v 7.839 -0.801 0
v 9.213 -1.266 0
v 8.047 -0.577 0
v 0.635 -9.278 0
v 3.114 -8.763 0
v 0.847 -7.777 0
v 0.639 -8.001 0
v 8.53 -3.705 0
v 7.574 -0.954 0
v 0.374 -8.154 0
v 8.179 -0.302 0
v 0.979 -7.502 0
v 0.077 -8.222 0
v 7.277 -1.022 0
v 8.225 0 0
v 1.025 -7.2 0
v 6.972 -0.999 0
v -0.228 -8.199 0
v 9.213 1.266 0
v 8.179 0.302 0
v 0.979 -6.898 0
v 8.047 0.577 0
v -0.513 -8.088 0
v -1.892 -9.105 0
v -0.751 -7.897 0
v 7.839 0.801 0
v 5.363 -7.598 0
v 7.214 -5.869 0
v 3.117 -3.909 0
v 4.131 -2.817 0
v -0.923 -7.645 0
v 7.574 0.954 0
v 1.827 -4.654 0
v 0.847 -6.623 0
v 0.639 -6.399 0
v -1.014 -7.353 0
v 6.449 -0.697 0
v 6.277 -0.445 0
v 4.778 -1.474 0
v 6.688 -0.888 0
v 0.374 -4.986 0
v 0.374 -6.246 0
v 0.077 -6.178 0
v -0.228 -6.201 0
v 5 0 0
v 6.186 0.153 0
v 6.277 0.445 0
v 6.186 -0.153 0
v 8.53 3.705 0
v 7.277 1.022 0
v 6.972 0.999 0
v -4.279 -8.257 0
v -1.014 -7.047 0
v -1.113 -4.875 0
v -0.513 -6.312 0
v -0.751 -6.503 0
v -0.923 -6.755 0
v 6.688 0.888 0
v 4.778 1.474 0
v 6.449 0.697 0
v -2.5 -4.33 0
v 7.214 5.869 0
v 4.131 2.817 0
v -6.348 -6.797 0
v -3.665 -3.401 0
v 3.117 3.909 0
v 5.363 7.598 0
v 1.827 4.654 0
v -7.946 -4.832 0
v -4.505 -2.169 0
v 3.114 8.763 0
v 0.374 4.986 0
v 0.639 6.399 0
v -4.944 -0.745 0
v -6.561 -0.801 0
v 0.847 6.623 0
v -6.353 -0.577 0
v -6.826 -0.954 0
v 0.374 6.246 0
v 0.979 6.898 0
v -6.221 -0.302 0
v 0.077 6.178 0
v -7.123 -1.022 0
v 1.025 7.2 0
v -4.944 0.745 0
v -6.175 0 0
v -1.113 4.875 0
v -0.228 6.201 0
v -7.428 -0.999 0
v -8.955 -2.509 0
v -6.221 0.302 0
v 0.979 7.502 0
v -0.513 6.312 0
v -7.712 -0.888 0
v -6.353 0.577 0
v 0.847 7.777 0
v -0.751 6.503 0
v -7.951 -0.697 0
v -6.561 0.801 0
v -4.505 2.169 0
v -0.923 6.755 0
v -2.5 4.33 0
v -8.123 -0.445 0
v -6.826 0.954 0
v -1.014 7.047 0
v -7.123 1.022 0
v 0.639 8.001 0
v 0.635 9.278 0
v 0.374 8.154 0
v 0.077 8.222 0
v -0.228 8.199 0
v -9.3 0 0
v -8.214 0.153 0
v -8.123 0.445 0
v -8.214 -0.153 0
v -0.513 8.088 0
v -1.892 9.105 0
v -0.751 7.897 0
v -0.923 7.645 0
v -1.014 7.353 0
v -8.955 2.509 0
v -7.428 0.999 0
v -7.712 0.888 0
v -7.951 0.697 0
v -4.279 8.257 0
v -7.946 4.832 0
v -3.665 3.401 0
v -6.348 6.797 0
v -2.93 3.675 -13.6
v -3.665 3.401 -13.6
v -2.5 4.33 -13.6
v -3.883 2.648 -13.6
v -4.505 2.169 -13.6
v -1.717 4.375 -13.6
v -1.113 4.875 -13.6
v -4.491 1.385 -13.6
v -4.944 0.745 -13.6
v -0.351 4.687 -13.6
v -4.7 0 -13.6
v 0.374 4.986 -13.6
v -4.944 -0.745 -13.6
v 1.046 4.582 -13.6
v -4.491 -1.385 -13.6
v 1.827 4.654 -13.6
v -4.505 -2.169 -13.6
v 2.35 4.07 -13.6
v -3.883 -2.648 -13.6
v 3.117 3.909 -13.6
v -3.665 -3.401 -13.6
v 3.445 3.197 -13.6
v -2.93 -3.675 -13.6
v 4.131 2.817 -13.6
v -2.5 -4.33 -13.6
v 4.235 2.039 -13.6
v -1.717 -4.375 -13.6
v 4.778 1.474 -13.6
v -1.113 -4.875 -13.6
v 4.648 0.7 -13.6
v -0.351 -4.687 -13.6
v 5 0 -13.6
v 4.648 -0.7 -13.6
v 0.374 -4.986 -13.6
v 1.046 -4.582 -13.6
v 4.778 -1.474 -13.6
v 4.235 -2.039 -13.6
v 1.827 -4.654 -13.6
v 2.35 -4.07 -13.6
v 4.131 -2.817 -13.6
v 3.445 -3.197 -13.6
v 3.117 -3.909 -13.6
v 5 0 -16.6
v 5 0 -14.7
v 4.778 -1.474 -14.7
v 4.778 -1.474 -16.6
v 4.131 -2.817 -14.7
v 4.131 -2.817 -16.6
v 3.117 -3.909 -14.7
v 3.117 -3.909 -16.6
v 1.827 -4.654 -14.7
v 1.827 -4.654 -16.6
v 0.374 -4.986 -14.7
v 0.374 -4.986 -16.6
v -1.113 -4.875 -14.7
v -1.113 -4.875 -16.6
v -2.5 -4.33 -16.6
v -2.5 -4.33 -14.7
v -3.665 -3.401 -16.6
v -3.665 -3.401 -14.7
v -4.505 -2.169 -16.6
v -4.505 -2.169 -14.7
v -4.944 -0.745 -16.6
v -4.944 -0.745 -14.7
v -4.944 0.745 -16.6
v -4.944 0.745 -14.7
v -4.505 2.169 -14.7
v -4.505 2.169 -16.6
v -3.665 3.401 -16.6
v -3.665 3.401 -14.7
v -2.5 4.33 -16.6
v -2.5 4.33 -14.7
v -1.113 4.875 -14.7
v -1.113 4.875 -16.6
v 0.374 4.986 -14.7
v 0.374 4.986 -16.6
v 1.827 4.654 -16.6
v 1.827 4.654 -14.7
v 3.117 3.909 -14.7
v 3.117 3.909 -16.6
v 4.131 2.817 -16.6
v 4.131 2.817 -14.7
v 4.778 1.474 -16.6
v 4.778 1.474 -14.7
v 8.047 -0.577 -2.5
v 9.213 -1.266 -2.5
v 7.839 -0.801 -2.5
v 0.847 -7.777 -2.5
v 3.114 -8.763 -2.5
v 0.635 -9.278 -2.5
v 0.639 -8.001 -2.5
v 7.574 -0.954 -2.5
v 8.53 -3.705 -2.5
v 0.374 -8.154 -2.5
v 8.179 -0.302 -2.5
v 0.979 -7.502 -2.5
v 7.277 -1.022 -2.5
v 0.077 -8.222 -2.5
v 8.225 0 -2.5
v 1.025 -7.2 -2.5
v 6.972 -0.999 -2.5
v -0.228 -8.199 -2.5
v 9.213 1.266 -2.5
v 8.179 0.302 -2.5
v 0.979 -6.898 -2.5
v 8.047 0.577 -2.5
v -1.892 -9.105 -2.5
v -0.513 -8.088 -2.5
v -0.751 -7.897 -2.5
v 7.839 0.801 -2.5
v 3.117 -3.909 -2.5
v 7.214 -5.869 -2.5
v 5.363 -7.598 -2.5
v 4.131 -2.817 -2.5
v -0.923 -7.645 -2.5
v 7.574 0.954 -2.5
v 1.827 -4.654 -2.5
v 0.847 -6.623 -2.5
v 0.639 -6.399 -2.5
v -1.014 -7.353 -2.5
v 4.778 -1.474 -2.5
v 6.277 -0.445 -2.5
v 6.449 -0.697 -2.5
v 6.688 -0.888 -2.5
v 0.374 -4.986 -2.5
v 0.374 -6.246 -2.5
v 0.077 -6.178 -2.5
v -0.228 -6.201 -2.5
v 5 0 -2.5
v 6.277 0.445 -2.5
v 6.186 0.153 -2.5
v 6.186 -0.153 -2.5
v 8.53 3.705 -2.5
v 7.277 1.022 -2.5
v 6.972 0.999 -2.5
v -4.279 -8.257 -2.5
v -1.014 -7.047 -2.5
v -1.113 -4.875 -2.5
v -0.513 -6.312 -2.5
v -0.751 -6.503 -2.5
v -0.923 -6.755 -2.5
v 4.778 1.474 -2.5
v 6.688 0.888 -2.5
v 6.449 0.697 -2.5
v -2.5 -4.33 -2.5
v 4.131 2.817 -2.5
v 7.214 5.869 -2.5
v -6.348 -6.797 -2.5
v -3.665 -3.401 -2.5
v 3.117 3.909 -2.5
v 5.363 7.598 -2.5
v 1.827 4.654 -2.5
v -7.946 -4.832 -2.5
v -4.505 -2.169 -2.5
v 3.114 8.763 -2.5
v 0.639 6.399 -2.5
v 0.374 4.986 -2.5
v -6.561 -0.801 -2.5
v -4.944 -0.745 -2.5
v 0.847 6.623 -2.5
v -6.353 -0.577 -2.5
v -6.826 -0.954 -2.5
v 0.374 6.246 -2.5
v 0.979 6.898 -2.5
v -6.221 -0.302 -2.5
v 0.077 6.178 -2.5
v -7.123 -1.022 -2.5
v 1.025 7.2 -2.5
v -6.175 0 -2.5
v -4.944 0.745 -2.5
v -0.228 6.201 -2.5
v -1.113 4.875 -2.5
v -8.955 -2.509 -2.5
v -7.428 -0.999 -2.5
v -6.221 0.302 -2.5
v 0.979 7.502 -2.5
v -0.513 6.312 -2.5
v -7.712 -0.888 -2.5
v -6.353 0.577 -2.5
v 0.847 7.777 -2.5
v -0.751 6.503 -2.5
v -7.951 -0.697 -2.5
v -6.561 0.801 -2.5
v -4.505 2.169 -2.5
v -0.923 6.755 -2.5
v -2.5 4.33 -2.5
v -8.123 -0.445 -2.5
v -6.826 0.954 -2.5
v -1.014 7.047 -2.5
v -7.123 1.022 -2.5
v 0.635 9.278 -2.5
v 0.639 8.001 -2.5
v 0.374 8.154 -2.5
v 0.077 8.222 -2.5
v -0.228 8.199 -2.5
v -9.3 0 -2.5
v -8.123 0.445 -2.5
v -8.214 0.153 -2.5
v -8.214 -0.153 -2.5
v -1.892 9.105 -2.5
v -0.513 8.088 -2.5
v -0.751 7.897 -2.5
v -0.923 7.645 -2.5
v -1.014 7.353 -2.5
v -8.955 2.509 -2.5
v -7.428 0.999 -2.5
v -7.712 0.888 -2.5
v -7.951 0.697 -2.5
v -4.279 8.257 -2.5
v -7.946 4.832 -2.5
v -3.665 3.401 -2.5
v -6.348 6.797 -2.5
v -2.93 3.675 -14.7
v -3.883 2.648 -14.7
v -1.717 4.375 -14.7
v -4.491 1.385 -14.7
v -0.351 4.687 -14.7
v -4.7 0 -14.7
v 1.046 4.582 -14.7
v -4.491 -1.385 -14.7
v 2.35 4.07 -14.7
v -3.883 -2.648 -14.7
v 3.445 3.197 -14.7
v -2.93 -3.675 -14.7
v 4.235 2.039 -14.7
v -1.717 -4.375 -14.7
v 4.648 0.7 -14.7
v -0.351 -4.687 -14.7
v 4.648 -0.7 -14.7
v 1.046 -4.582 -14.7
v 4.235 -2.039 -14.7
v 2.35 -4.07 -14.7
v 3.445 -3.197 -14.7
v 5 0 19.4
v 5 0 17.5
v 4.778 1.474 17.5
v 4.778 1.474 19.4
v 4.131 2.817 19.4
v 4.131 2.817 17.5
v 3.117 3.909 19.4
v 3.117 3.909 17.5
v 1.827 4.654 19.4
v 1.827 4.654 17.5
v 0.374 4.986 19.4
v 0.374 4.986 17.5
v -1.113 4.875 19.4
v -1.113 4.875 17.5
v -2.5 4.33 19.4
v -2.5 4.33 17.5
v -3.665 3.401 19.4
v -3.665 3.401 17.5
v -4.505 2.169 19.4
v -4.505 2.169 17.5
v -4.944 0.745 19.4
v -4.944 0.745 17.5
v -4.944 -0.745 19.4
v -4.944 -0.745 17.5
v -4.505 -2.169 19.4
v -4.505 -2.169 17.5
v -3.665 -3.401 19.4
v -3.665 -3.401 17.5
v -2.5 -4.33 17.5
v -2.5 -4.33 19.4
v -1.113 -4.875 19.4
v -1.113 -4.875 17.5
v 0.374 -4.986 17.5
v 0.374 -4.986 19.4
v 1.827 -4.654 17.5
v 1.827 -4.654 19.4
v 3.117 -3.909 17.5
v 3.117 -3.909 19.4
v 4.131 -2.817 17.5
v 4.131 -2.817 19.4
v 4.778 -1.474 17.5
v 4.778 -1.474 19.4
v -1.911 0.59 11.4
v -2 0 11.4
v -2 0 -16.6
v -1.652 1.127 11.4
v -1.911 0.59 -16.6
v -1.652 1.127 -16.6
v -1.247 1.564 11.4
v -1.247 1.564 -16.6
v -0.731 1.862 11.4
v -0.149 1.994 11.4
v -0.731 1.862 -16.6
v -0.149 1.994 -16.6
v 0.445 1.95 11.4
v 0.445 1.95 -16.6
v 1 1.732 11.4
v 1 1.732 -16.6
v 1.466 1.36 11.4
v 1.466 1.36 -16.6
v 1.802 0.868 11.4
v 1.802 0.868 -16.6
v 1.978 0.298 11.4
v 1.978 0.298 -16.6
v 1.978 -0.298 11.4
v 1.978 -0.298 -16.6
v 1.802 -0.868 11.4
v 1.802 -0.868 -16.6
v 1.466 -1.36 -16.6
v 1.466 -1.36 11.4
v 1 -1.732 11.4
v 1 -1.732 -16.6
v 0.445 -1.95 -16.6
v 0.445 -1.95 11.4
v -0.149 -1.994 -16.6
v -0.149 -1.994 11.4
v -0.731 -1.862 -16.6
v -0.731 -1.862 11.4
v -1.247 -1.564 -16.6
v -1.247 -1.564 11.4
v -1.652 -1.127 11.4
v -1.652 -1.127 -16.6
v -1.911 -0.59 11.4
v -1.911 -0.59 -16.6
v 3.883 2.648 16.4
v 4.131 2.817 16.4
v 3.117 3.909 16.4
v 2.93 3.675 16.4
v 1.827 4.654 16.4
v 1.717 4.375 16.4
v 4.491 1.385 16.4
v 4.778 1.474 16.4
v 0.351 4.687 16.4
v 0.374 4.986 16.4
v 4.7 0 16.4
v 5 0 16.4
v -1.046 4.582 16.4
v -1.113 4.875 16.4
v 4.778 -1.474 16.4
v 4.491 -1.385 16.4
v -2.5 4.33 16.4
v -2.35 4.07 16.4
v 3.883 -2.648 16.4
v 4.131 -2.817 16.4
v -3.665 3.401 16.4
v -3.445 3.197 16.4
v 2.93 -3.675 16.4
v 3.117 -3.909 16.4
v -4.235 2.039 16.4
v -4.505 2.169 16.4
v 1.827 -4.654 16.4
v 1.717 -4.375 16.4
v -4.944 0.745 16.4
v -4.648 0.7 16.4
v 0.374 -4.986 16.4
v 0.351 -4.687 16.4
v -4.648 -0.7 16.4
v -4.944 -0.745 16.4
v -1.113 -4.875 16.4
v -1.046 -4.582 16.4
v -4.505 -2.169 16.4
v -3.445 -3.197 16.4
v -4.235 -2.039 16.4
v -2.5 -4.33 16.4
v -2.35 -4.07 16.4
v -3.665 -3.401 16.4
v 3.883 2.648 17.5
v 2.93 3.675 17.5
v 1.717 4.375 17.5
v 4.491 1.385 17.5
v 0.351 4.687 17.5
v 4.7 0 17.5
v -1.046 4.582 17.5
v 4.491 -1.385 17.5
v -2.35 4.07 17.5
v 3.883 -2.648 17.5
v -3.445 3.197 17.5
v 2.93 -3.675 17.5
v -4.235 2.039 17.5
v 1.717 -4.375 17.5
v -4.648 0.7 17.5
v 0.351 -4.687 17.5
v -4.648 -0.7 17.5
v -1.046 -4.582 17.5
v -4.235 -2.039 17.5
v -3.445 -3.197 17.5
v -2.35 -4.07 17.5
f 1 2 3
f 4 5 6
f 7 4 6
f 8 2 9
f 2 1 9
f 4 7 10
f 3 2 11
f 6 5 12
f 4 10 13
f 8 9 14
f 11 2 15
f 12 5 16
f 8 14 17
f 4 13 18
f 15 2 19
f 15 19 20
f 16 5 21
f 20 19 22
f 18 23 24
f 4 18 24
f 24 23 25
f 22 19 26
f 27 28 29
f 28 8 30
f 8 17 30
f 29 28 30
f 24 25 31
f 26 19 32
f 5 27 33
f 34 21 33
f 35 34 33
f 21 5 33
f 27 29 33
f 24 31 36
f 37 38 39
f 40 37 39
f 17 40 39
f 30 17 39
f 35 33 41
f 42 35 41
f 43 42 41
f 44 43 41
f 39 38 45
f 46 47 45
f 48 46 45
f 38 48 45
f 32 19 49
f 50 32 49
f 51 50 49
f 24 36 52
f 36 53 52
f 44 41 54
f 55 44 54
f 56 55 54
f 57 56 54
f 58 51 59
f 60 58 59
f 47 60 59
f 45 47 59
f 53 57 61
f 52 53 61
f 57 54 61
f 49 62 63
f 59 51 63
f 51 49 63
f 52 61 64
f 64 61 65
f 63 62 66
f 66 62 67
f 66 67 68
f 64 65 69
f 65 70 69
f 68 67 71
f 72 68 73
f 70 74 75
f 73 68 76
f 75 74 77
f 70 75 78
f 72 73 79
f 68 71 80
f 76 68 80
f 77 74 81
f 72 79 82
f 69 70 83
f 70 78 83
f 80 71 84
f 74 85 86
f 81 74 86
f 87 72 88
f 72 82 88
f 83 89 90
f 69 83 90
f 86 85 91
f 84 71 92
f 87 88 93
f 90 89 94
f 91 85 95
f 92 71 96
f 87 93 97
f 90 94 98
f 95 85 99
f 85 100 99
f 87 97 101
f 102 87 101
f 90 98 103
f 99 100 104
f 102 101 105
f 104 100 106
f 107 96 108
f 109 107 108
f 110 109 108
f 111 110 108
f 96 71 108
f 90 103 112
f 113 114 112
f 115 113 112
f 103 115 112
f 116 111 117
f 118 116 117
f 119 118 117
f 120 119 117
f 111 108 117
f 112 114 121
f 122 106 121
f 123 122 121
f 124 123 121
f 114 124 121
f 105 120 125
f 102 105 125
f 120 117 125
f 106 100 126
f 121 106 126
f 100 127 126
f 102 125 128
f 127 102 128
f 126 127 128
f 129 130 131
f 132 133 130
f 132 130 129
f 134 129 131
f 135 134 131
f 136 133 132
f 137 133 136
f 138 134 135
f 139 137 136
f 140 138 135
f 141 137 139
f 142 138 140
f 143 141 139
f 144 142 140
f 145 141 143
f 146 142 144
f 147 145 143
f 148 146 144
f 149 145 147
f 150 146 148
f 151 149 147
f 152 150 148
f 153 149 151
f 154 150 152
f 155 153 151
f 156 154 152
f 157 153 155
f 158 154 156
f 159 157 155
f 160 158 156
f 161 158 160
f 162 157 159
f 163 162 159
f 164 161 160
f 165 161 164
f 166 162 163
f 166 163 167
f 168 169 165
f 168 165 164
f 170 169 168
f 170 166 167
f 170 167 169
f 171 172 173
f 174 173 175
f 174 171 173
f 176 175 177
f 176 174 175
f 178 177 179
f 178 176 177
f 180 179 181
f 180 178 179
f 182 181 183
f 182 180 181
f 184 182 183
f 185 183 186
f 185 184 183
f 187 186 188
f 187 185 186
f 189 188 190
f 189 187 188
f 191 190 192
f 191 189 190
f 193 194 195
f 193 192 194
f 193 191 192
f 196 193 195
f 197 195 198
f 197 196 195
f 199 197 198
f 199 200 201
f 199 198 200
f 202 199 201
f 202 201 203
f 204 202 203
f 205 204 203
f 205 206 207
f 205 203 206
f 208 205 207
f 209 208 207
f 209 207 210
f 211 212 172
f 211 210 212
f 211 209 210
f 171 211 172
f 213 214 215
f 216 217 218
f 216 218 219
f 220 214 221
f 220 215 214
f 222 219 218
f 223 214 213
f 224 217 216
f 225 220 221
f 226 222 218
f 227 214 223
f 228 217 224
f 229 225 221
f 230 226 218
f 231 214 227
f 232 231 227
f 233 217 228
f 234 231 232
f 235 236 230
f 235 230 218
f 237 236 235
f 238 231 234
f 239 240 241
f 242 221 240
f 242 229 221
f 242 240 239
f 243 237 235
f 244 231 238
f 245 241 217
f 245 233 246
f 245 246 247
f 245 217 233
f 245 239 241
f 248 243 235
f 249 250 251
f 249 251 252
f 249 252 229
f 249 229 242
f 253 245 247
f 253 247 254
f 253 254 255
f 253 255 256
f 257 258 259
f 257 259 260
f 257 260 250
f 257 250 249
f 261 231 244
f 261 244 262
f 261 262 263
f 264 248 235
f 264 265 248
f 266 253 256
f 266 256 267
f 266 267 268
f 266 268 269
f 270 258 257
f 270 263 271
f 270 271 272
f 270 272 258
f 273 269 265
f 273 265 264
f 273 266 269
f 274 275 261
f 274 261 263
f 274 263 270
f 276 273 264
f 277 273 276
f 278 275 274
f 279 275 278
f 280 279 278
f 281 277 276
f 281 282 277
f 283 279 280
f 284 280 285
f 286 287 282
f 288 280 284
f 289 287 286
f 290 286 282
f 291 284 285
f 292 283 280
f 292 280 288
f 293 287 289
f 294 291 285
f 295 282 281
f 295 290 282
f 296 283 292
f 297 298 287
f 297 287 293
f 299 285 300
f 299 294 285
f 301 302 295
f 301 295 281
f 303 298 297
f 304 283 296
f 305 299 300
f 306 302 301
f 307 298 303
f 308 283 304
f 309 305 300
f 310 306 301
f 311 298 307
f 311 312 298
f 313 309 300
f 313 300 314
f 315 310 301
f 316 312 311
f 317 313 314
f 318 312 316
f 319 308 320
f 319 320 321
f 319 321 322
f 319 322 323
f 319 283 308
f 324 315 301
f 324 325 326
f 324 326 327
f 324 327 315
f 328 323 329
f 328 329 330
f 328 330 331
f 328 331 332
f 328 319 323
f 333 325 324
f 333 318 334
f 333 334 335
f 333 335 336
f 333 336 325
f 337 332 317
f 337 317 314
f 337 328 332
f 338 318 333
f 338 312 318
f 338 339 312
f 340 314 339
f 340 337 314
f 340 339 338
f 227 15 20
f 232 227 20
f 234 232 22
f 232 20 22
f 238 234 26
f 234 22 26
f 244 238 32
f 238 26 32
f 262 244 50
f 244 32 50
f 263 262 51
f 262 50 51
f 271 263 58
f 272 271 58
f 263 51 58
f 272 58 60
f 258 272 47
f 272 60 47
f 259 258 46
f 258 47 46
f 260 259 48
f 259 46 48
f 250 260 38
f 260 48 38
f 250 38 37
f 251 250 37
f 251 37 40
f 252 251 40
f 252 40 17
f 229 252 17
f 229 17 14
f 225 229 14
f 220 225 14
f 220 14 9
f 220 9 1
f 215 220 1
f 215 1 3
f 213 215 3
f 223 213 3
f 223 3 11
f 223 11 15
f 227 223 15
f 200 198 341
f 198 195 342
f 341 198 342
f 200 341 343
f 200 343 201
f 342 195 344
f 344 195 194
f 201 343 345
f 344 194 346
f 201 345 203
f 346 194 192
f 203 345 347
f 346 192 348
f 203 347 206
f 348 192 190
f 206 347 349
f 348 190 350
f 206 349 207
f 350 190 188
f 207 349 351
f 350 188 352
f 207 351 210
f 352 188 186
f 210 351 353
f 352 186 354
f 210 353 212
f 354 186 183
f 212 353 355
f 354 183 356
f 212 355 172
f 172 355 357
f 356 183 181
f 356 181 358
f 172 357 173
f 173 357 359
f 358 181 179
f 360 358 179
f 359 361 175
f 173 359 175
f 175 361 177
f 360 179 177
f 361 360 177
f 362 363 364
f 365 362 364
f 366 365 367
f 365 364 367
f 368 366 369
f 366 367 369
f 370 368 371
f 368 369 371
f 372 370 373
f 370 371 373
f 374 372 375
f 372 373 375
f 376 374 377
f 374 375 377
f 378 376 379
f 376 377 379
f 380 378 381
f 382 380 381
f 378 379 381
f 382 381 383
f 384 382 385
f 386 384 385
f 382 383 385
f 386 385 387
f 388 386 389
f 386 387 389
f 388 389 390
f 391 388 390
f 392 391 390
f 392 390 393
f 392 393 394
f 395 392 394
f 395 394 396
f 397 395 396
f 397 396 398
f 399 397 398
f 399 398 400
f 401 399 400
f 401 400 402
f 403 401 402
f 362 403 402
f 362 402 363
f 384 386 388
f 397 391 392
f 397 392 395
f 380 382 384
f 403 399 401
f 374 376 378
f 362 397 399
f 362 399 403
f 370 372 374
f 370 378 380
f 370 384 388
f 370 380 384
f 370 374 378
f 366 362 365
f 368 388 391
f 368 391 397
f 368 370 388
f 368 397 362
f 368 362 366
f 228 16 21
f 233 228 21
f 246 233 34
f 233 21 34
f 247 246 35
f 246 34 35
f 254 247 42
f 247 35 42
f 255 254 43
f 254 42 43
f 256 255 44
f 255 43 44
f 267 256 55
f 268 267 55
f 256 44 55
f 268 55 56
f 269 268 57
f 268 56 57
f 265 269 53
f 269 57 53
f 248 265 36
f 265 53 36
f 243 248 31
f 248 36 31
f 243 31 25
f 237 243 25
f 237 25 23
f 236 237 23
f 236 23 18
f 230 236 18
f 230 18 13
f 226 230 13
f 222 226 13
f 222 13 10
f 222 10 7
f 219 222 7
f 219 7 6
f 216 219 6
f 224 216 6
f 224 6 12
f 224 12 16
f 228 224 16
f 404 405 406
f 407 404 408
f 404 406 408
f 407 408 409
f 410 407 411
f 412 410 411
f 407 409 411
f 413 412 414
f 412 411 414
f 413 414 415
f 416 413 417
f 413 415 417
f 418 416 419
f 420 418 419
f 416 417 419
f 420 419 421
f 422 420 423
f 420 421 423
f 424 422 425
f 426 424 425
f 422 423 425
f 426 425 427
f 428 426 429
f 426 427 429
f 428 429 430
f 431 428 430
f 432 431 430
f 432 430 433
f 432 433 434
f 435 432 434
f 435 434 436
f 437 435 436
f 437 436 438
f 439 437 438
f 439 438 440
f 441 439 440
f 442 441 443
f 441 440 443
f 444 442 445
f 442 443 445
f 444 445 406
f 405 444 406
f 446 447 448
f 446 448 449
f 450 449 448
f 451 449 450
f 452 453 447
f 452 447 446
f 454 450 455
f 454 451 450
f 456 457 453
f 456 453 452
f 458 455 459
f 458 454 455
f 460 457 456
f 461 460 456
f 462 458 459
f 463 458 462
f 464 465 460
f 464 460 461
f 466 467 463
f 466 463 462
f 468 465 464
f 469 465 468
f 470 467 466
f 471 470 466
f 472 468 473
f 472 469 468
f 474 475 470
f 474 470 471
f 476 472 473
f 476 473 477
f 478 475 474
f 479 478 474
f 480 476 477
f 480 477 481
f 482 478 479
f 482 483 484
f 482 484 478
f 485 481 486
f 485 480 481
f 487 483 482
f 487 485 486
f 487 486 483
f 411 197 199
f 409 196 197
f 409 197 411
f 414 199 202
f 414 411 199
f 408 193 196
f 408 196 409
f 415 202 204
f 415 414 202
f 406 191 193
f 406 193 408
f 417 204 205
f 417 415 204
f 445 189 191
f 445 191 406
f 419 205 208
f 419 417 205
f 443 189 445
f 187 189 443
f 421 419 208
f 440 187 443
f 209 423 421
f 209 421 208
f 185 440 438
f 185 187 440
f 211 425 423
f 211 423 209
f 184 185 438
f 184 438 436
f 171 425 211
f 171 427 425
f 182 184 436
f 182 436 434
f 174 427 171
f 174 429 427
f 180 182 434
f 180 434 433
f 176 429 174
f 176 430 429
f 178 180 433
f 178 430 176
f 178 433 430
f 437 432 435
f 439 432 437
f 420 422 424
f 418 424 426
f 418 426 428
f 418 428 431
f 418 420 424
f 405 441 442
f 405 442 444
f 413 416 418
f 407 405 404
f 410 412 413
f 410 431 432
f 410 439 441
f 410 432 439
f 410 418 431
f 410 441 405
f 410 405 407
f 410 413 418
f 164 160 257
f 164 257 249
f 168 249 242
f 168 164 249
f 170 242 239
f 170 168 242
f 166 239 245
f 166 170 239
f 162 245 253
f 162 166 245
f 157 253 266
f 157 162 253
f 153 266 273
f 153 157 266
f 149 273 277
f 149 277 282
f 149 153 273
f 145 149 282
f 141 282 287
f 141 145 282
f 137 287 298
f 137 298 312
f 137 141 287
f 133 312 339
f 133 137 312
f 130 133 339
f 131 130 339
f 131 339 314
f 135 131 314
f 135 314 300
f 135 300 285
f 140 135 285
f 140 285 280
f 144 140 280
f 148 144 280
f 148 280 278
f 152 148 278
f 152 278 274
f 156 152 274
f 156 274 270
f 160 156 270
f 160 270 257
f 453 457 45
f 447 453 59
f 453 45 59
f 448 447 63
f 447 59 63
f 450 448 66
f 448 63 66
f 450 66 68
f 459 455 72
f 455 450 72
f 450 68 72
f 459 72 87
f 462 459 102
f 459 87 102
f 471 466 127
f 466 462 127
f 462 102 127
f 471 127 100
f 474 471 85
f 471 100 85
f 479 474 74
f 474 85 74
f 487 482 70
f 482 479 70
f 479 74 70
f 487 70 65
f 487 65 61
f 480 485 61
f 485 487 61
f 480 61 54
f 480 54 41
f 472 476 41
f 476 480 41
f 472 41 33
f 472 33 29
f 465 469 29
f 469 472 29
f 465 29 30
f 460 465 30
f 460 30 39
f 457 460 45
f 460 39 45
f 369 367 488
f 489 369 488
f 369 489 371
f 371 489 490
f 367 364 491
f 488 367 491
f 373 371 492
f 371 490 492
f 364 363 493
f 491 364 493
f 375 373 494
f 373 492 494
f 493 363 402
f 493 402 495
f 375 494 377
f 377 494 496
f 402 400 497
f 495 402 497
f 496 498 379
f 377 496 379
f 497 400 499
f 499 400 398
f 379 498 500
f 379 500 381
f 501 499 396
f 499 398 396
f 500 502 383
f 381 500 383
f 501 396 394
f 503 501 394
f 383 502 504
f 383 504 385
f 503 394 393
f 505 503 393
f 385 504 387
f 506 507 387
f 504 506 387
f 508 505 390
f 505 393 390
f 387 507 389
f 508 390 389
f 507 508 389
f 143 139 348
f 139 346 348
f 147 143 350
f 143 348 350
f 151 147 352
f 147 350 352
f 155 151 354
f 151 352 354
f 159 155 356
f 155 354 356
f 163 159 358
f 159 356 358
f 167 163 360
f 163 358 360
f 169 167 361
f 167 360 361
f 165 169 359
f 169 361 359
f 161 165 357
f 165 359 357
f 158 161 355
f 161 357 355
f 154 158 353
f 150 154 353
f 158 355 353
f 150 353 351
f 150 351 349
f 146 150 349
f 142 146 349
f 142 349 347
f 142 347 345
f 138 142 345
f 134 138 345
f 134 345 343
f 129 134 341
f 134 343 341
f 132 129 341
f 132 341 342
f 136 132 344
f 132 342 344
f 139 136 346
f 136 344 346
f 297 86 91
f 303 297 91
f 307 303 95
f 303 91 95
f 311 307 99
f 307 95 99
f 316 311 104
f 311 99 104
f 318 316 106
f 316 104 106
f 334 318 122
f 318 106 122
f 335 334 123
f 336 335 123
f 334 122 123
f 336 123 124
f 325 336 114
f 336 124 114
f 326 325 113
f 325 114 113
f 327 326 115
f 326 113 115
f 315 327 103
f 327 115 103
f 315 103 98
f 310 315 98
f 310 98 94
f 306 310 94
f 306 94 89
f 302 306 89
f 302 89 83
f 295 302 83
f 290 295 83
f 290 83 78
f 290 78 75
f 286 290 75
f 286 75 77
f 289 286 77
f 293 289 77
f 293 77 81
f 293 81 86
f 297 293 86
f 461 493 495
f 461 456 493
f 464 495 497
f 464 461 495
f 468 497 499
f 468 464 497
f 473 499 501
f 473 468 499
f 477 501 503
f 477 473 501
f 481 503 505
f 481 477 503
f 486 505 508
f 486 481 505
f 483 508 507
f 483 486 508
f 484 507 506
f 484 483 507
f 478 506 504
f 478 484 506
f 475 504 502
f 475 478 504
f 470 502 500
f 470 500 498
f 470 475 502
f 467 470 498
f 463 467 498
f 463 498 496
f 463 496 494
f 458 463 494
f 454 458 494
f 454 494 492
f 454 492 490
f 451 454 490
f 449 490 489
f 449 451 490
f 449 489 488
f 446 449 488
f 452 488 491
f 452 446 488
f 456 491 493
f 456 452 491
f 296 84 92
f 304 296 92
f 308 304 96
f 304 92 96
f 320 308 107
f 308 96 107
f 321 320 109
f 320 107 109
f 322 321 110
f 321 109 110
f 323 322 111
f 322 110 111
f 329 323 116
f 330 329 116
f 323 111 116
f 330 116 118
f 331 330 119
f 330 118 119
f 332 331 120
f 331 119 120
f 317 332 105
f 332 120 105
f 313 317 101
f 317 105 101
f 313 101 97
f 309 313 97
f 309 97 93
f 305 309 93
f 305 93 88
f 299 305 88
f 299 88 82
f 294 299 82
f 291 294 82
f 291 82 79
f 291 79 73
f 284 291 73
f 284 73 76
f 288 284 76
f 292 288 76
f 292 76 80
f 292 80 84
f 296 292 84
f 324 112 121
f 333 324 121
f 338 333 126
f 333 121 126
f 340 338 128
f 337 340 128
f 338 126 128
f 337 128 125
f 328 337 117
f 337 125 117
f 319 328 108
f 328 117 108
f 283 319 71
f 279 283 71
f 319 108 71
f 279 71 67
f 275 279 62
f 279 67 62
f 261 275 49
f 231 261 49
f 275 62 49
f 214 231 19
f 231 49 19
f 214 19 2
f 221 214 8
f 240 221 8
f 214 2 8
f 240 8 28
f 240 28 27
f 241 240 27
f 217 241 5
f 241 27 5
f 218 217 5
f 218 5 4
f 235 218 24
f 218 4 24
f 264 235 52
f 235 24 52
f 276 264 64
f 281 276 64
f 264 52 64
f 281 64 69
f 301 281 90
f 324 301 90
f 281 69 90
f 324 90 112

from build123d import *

# Parameters (mm, degrees)
SKETCH_1_R               = 5
EXTRUDE_1_DEPTH          = 19.4
SKETCH_2_R               = 9.3
EXTRUDE_2_DEPTH          = 2.5
EXTRUDE_START            = 14.1
SKETCH_3_R               = 5
EXTRUDE_3_DEPTH          = 14.1
SKETCH_5_W               = 0.3
SKETCH_5_H               = 1.1
SKETCH_6_W               = 0.3
SKETCH_6_H               = 1.1
HOLE_WIZARD_M2_5_2_D     = 2.05
HOLE_WIZARD_M2_5_2_DEPTH = 7.25
HOLE_WIZARD_M2_5_2_TIP   = 0.591784026
SKETCH_12_R              = 2
CUT_EXTRUDE_1_DEPTH      = 28


with BuildPart() as part:
    # 草图1 → 凸台-拉伸1 (new body)
    with BuildSketch(Plane.XY):
        Circle(SKETCH_1_R)
    extrude(amount=EXTRUDE_1_DEPTH)

    # 草图2 → 凸台-拉伸2 (add)
    with BuildSketch(Plane(origin=(0, 0, 0), x_dir=(-1, 0, 0), z_dir=(0, 0, -1))):
        Circle(SKETCH_2_R)
    extrude(amount=EXTRUDE_2_DEPTH)

    # 草图3 → 凸台-拉伸3 (add)
    with BuildSketch(Plane(origin=(0, 0, -2.5), x_dir=(-1, 0, 0), z_dir=(0, 0, -1)).offset(EXTRUDE_START)):
        with Locations(Location((0, 0, 0), (0, 0, 180))):
            Circle(SKETCH_3_R)
    extrude(amount=-EXTRUDE_3_DEPTH)

    # 草图5 → 切除-旋转3 (revolve, cut)
    with BuildSketch(Plane(origin=(0, 0, 0), x_dir=(1, 0, 0), z_dir=(0, 1, 0)), mode=Mode.PRIVATE) as cut_revolve_3_sk:
        with Locations((4.85, 14.15)):
            Rectangle(SKETCH_5_W, SKETCH_5_H)
    revolve(cut_revolve_3_sk.sketch.rotate(Axis((0, 0, -16.6), (0, 0, 1)), 180), axis=Axis((0, 0, -16.6), (0, 0, 1)), mode=Mode.SUBTRACT)

    # 草图6 → 切除-旋转4 (revolve, cut)
    with BuildSketch(Plane(origin=(0, 0, 0), x_dir=(1, 0, 0), z_dir=(0, 1, 0))):
        with Locations((4.85, -16.95)):
            Rectangle(SKETCH_6_W, SKETCH_6_H)
    revolve(axis=Axis((0, 0, 19.4), (0, 0, -1)), mode=Mode.SUBTRACT)

    # M2.5 螺纹孔2
    with Locations(Plane(origin=(0, 7.2, -2.5), x_dir=(-1, 0, 0), z_dir=(0, 0, -1))):
        with Locations((0, 0), (7.2, -7.2), (-7.2, -7.2), (0, -14.4)):
            Hole(HOLE_WIZARD_M2_5_2_D / 2, depth=HOLE_WIZARD_M2_5_2_DEPTH)
            with Locations((0, 0, -(HOLE_WIZARD_M2_5_2_DEPTH + HOLE_WIZARD_M2_5_2_TIP / 2))):  # 120° drill point
                Cone(0, HOLE_WIZARD_M2_5_2_D / 2, HOLE_WIZARD_M2_5_2_TIP, mode=Mode.SUBTRACT)

    # 草图12 → 切除-拉伸1 (cut)
    with BuildSketch(Plane(origin=(0, 0, -16.6), x_dir=(-1, 0, 0), z_dir=(0, 0, -1))):
        Circle(SKETCH_12_R)
    extrude(amount=-CUT_EXTRUDE_1_DEPTH, mode=Mode.SUBTRACT)


solid = part.part
